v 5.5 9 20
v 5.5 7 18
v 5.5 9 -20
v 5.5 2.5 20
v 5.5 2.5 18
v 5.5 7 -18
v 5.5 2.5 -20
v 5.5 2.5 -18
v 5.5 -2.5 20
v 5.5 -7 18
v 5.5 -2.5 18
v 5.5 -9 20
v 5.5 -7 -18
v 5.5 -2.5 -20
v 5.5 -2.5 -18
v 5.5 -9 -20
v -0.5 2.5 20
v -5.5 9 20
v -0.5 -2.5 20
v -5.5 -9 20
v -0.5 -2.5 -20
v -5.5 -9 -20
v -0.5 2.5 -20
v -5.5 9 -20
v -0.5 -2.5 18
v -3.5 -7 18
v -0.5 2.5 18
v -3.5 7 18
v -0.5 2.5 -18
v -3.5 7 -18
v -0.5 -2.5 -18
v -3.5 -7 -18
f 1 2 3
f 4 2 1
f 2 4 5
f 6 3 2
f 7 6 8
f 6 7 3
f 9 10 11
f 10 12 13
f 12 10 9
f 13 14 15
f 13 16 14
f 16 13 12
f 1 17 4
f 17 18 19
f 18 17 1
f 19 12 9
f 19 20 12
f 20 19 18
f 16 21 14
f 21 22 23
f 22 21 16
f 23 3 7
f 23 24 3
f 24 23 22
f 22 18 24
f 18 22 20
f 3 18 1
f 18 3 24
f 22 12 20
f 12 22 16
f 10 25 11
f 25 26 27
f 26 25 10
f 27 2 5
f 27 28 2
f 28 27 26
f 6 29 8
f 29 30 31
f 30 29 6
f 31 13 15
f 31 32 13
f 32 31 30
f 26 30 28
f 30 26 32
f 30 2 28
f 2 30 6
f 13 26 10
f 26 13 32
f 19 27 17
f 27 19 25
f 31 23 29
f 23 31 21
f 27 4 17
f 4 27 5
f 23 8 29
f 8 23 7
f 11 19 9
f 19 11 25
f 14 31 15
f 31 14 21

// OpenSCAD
difference() {
  cube([11, 18, 40], true);
  translate([1, 0, 0])
    cube([9, 14, 36], true);
  translate([3, 0, 0])
    cube([7, 5, 40], true);
}
